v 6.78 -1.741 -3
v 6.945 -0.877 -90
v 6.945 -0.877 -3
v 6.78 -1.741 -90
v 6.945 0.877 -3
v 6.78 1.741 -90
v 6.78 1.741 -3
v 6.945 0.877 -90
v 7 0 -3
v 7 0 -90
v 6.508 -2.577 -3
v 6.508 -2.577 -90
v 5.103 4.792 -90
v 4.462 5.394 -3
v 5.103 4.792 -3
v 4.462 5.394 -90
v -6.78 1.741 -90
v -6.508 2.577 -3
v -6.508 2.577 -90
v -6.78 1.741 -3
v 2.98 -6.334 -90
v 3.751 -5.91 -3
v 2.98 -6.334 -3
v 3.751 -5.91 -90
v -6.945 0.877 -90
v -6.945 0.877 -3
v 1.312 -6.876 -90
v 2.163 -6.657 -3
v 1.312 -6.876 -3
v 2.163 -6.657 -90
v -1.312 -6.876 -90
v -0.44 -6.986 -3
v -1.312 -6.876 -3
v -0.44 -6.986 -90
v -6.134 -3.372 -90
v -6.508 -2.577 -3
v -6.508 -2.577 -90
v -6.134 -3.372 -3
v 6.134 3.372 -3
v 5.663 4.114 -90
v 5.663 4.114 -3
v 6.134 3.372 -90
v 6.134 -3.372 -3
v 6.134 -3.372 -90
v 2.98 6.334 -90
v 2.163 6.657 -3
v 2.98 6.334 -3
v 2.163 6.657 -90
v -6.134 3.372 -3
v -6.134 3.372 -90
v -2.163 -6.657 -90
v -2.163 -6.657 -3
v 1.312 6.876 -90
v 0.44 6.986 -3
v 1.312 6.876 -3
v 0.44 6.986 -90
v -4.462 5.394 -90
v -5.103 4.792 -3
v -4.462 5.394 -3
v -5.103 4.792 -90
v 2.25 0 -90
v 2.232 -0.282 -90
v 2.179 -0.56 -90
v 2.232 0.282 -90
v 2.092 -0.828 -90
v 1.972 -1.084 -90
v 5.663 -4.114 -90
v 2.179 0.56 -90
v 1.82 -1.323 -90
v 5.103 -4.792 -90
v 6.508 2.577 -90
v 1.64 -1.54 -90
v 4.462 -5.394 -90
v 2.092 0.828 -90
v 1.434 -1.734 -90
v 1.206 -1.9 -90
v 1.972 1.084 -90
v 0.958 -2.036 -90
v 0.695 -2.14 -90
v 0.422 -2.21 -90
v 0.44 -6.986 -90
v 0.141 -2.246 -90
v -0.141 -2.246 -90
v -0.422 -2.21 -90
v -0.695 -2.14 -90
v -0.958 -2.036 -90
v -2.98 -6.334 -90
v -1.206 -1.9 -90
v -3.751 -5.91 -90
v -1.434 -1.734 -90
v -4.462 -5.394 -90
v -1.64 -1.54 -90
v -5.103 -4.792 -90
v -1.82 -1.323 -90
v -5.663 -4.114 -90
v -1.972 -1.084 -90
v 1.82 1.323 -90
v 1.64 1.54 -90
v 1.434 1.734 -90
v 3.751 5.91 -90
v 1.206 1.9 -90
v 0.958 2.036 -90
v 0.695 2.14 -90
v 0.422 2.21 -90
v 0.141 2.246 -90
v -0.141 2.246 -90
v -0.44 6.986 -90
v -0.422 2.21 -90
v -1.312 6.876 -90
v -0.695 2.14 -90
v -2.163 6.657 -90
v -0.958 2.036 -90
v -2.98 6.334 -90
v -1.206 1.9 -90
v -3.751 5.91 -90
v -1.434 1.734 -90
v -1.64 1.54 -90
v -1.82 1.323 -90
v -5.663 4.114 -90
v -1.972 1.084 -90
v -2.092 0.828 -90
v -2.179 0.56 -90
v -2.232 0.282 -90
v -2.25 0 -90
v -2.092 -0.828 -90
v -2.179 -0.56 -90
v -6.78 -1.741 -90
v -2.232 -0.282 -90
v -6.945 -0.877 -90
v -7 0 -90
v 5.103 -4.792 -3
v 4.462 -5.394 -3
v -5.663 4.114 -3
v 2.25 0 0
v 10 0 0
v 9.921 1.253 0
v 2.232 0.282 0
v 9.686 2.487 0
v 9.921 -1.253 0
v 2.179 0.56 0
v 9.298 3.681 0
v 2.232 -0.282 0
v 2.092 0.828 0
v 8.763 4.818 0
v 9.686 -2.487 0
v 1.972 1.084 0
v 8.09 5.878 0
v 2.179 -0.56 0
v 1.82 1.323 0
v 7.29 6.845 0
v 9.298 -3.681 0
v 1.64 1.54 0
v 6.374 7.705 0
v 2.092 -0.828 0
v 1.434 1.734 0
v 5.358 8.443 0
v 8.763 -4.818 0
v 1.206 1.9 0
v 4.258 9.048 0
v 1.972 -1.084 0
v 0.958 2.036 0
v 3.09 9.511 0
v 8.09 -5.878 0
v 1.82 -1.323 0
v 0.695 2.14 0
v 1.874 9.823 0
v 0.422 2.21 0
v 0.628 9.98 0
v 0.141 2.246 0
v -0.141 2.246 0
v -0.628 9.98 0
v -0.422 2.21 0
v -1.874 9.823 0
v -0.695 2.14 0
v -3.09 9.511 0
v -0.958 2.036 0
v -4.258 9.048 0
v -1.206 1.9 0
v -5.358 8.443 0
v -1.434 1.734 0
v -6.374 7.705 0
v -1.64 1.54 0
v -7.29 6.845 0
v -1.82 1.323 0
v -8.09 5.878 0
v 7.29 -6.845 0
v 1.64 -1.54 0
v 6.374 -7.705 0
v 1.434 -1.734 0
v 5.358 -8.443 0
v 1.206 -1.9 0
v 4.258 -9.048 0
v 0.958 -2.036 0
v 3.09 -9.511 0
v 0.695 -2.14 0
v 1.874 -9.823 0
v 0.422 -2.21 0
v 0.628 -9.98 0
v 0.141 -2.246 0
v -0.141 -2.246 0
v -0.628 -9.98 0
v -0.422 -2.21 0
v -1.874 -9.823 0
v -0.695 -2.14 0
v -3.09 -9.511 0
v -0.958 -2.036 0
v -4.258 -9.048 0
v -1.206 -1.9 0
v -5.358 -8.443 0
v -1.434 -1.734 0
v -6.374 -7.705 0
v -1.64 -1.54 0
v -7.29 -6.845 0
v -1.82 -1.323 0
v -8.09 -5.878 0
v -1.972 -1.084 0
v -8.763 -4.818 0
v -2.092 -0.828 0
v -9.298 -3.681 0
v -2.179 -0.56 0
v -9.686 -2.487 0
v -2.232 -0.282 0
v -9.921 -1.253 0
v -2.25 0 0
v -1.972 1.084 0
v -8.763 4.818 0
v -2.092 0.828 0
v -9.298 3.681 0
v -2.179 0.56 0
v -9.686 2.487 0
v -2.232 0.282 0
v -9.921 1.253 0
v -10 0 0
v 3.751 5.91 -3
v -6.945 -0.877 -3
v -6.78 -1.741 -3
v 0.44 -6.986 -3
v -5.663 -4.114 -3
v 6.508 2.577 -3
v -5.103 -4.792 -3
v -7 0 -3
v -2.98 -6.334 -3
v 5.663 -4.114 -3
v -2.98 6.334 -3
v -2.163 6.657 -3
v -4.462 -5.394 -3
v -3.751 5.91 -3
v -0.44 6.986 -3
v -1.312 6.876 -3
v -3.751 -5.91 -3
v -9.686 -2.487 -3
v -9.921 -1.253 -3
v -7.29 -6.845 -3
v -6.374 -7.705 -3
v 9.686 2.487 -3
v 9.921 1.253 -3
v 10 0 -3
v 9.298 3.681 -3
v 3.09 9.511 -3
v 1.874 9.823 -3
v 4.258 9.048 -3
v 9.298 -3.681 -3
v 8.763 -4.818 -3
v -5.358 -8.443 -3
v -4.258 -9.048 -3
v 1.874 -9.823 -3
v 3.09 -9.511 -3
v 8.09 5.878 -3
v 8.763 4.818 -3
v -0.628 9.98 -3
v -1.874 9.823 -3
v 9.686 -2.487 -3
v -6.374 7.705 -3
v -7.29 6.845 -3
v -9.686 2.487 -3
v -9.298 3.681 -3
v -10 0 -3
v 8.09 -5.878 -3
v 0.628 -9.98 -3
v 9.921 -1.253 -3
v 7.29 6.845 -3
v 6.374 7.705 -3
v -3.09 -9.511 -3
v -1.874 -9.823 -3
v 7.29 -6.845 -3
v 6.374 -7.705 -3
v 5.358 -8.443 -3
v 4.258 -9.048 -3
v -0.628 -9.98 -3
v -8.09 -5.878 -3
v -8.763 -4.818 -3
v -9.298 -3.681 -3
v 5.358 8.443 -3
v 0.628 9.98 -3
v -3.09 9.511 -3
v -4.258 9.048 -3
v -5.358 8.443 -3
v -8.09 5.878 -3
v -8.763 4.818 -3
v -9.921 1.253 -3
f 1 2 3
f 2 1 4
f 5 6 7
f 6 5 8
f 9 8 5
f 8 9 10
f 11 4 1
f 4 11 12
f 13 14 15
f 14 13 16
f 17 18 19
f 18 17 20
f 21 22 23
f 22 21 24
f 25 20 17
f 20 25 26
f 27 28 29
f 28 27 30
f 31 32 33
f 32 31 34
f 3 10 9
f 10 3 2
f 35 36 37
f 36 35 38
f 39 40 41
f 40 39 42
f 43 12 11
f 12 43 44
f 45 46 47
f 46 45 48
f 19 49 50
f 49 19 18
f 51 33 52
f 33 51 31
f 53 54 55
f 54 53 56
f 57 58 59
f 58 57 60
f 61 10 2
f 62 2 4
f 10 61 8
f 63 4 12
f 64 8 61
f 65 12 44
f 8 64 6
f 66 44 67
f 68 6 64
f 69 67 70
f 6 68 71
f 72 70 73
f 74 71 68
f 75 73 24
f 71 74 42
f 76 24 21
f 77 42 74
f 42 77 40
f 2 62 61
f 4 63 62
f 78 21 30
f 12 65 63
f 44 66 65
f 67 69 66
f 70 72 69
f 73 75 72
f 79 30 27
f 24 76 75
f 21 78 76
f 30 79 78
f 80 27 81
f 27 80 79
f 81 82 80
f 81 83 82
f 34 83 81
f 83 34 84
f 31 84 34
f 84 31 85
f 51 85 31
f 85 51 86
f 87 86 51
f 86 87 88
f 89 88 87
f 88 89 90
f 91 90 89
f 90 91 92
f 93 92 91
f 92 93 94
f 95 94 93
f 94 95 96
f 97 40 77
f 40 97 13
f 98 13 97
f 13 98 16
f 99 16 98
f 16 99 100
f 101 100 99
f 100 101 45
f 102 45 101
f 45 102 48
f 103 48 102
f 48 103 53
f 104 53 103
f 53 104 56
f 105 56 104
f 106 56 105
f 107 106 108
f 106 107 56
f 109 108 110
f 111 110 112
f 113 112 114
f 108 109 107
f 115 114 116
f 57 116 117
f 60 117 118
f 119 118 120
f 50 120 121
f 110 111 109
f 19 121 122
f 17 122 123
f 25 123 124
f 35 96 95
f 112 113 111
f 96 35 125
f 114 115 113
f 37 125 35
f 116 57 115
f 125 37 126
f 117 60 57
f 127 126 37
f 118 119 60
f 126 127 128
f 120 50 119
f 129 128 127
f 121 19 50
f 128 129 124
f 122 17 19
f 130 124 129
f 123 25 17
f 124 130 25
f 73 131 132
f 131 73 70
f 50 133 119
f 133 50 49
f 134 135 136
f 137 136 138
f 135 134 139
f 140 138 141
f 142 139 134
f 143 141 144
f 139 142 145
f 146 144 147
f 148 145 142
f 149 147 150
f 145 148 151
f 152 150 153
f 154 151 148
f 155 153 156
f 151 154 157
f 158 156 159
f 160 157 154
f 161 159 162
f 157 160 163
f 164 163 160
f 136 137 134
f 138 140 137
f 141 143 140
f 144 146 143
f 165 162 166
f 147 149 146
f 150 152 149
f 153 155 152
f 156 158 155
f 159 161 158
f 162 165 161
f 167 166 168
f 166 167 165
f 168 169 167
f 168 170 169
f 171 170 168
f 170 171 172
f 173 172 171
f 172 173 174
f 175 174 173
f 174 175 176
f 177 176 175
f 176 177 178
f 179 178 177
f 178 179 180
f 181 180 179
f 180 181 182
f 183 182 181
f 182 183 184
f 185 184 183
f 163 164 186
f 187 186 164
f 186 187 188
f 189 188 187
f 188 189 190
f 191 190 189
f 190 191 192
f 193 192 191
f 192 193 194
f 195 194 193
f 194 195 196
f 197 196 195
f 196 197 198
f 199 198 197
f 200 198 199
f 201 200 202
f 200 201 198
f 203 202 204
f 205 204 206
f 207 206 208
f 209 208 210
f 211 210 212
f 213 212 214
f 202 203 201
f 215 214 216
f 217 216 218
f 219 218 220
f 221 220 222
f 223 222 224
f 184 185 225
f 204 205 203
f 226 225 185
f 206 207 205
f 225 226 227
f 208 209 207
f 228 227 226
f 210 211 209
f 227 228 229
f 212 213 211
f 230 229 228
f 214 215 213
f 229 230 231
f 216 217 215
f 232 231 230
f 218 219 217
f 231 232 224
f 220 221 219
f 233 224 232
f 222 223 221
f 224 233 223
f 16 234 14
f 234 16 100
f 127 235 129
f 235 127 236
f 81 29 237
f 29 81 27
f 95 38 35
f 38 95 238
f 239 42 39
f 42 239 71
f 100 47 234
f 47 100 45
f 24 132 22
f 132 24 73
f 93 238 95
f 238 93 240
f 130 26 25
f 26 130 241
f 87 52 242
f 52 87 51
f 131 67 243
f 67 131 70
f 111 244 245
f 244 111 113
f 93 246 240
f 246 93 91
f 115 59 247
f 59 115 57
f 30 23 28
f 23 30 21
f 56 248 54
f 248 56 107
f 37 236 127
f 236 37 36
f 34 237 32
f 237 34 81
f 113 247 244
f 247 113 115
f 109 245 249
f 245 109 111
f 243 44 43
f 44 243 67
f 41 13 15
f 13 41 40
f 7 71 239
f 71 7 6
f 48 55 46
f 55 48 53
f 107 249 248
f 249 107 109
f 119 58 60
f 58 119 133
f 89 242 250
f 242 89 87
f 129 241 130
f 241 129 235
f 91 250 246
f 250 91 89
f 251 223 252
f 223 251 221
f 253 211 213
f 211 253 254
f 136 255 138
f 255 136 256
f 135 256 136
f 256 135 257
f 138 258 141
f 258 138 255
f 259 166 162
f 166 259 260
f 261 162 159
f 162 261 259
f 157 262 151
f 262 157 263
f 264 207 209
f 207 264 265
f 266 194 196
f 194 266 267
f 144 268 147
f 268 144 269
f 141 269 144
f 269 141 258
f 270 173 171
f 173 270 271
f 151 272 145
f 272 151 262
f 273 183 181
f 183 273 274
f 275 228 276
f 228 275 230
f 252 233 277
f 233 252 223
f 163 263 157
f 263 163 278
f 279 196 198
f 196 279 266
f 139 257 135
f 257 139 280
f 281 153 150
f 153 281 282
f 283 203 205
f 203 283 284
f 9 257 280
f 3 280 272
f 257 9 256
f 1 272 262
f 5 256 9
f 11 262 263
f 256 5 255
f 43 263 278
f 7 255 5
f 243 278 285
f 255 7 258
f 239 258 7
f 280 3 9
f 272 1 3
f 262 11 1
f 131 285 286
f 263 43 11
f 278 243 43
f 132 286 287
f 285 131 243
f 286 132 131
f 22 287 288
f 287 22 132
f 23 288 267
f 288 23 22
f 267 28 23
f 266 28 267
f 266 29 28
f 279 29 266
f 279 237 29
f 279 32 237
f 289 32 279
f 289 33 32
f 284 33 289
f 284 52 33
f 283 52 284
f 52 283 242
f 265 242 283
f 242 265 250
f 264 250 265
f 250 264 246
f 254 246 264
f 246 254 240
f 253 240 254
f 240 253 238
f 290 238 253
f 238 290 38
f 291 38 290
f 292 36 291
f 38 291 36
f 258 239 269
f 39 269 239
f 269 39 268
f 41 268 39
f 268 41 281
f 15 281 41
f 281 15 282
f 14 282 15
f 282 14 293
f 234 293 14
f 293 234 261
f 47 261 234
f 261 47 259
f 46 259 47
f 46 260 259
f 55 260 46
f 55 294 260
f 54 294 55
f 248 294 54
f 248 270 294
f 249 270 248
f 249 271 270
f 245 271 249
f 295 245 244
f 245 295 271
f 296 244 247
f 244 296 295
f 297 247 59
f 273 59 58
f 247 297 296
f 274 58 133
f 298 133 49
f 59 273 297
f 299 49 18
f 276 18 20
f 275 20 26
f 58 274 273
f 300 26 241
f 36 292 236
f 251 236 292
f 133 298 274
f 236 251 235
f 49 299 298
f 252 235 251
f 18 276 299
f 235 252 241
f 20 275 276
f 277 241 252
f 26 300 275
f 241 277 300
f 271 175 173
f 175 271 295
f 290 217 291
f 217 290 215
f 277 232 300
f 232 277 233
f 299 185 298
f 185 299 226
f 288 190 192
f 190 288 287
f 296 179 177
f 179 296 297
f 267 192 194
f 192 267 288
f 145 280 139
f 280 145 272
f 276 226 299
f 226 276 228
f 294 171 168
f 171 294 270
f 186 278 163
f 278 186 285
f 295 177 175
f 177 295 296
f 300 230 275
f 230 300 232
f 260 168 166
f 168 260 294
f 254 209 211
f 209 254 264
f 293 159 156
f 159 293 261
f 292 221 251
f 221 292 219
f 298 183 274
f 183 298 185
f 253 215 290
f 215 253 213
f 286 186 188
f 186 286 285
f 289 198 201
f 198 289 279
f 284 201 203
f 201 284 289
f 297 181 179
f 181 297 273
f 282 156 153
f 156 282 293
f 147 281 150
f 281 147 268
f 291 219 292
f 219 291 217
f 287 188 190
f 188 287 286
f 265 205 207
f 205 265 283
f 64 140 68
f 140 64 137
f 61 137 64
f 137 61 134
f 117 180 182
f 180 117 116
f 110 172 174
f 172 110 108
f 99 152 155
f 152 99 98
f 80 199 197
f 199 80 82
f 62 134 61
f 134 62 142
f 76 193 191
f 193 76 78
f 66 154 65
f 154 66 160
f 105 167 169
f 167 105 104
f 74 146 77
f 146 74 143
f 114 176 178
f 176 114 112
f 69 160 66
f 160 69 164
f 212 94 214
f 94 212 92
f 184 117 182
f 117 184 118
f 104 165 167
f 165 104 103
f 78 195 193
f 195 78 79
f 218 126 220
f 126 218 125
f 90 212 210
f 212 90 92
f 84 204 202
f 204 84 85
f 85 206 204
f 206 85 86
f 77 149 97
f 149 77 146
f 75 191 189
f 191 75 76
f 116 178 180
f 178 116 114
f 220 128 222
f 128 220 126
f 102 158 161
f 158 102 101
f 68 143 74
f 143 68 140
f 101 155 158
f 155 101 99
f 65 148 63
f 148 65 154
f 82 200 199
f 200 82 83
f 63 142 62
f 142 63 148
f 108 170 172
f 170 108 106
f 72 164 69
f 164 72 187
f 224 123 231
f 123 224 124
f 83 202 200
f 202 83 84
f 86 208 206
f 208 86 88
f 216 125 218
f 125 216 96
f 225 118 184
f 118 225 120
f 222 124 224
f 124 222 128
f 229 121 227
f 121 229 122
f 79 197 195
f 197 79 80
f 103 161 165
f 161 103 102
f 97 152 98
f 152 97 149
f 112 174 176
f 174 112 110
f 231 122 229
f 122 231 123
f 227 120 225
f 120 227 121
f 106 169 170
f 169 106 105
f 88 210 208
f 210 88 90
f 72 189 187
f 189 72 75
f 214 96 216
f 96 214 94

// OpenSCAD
$fn = 50;


difference() {
	union() {
		translate(v = [0, 0, -90.0000000000]) {
			cylinder(h = 90, r = 7.0000000000);
		}
		translate(v = [0, 0, -3.0000000000]) {
			cylinder(h = 3, r = 10.0000000000);
		}
	}
	union() {
		#translate(v = [0, 0, -90]) {
			cylinder(h = 90, r = 2.2500000000);
		}
	}
}
